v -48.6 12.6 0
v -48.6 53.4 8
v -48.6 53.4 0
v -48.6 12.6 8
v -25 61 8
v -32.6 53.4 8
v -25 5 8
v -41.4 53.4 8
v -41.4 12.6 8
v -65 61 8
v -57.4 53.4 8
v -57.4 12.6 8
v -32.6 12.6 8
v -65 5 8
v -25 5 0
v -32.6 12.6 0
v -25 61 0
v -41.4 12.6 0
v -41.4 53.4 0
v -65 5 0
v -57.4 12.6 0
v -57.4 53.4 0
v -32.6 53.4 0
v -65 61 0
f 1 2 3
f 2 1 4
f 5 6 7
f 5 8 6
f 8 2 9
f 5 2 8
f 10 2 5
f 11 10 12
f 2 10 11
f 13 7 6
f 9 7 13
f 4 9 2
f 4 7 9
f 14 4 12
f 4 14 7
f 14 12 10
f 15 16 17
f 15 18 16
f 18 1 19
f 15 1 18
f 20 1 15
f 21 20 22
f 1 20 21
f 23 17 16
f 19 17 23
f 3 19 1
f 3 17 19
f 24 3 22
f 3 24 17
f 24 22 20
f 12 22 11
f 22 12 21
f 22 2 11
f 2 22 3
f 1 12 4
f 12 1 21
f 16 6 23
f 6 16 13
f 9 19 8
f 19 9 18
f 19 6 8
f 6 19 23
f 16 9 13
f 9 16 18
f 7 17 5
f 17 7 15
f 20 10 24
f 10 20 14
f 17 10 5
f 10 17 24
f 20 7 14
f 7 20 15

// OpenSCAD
difference() {
  translate([-45.0000000000, 33.0001196000, 4.0000000000]) {
    scale([40.0000000000, 56.0000000000, 8.0000000000]) {
      translate([-0.5000000000, -0.5000000000, -0.5000000000]) {
        cube([1, 1, 1]);
      }
    }
  }
  union() {
    translate([-53.0000000000, 33.0000000000, 4.0000000000]) {
      scale([8.8000000000, 40.8000000000, 8.0000000000]) {
        translate([-0.5000000000, -0.5000000000, -0.5000000000]) {
          cube([1, 1, 1]);
        }
      }
    }
    translate([-37.0000000000, 33.0000000000, 4.0000000000]) {
      scale([8.8000000000, 40.8000000000, 8.0000000000]) {
        translate([-0.5000000000, -0.5000000000, -0.5000000000]) {
          cube([1, 1, 1]);
        }
      }
    }
  }
}
